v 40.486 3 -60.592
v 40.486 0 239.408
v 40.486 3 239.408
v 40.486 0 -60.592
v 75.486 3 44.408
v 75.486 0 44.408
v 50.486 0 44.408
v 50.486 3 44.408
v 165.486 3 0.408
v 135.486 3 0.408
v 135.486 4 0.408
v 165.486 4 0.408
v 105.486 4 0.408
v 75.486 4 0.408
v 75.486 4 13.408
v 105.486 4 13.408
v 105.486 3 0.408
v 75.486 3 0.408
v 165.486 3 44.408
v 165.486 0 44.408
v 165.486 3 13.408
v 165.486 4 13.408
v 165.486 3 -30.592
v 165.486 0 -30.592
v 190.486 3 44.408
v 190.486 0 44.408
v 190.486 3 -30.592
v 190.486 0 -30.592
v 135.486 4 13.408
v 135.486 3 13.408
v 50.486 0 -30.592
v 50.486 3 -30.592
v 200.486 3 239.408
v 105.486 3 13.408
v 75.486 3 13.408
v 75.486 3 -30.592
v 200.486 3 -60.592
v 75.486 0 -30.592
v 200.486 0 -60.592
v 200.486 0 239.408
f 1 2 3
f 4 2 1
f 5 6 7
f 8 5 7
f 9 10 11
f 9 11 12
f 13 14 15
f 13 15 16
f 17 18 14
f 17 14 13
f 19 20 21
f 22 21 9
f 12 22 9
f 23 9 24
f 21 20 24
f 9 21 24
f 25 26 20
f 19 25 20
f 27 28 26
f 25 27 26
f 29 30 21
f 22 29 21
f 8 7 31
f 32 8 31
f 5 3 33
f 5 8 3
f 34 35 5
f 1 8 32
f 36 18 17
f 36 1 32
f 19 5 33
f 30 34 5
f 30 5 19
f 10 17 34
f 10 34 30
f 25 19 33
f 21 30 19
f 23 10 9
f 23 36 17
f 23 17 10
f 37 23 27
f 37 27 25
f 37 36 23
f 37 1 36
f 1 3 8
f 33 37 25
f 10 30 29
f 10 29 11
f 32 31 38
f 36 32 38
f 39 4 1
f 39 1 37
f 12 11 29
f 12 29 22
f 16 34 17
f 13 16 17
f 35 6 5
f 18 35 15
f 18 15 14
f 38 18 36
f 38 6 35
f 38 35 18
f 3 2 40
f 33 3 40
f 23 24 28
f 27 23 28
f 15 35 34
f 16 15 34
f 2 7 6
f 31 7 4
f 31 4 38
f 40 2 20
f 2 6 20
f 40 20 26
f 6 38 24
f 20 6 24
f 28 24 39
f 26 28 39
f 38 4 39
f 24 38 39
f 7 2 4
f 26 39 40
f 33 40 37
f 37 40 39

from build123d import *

# Parameters (mm, degrees)
SKETCH1_W           = 160
SKETCH1_H           = 300
BOSS_EXTRUDE1_DEPTH = 3
SKETCH1_3_W         = 30
SKETCH1_3_H         = 13
BOSS_EXTRUDE2_DEPTH = 4


with BuildPart() as part:
    # Sketch1 → Boss-Extrude1 (new body)
    with BuildSketch(Plane(origin=(0, 0, 0), x_dir=(1, 0, 0), z_dir=(0, 1, 0))):
        with Locations((120.485764952, -89.40841277)):
            Rectangle(SKETCH1_W, SKETCH1_H)
        Polygon((50.485764952, -44.40841277), (50.485764952, 30.59158723), (75.485764952, 30.59158723), (75.485764952, -0.40841277), (105.485764952, -0.40841277), (105.485764952, -13.40841277), (75.485764952, -13.40841277), (75.485764952, -44.40841277), align=None, mode=Mode.SUBTRACT)
        Polygon((165.485764952, -0.40841277), (165.485764952, 30.59158723), (190.485764952, 30.59158723), (190.485764952, -44.40841277), (165.485764952, -44.40841277), (165.485764952, -13.40841277), (135.485764952, -13.40841277), (135.485764952, -0.40841277), align=None, mode=Mode.SUBTRACT)
    extrude(amount=BOSS_EXTRUDE1_DEPTH)

    # Sketch1<3> → Boss-Extrude2 (add)
    with BuildSketch(Plane(origin=(0, 0, 0), x_dir=(1, 0, 0), z_dir=(0, 1, 0))):
        with Locations((90.485764952, -6.90841277)):
            Rectangle(SKETCH1_3_W, SKETCH1_3_H)
        with Locations((150.485764952, -6.90841277)):
            Rectangle(SKETCH1_3_W, SKETCH1_3_H)
    extrude(amount=BOSS_EXTRUDE2_DEPTH)


solid = part.part
